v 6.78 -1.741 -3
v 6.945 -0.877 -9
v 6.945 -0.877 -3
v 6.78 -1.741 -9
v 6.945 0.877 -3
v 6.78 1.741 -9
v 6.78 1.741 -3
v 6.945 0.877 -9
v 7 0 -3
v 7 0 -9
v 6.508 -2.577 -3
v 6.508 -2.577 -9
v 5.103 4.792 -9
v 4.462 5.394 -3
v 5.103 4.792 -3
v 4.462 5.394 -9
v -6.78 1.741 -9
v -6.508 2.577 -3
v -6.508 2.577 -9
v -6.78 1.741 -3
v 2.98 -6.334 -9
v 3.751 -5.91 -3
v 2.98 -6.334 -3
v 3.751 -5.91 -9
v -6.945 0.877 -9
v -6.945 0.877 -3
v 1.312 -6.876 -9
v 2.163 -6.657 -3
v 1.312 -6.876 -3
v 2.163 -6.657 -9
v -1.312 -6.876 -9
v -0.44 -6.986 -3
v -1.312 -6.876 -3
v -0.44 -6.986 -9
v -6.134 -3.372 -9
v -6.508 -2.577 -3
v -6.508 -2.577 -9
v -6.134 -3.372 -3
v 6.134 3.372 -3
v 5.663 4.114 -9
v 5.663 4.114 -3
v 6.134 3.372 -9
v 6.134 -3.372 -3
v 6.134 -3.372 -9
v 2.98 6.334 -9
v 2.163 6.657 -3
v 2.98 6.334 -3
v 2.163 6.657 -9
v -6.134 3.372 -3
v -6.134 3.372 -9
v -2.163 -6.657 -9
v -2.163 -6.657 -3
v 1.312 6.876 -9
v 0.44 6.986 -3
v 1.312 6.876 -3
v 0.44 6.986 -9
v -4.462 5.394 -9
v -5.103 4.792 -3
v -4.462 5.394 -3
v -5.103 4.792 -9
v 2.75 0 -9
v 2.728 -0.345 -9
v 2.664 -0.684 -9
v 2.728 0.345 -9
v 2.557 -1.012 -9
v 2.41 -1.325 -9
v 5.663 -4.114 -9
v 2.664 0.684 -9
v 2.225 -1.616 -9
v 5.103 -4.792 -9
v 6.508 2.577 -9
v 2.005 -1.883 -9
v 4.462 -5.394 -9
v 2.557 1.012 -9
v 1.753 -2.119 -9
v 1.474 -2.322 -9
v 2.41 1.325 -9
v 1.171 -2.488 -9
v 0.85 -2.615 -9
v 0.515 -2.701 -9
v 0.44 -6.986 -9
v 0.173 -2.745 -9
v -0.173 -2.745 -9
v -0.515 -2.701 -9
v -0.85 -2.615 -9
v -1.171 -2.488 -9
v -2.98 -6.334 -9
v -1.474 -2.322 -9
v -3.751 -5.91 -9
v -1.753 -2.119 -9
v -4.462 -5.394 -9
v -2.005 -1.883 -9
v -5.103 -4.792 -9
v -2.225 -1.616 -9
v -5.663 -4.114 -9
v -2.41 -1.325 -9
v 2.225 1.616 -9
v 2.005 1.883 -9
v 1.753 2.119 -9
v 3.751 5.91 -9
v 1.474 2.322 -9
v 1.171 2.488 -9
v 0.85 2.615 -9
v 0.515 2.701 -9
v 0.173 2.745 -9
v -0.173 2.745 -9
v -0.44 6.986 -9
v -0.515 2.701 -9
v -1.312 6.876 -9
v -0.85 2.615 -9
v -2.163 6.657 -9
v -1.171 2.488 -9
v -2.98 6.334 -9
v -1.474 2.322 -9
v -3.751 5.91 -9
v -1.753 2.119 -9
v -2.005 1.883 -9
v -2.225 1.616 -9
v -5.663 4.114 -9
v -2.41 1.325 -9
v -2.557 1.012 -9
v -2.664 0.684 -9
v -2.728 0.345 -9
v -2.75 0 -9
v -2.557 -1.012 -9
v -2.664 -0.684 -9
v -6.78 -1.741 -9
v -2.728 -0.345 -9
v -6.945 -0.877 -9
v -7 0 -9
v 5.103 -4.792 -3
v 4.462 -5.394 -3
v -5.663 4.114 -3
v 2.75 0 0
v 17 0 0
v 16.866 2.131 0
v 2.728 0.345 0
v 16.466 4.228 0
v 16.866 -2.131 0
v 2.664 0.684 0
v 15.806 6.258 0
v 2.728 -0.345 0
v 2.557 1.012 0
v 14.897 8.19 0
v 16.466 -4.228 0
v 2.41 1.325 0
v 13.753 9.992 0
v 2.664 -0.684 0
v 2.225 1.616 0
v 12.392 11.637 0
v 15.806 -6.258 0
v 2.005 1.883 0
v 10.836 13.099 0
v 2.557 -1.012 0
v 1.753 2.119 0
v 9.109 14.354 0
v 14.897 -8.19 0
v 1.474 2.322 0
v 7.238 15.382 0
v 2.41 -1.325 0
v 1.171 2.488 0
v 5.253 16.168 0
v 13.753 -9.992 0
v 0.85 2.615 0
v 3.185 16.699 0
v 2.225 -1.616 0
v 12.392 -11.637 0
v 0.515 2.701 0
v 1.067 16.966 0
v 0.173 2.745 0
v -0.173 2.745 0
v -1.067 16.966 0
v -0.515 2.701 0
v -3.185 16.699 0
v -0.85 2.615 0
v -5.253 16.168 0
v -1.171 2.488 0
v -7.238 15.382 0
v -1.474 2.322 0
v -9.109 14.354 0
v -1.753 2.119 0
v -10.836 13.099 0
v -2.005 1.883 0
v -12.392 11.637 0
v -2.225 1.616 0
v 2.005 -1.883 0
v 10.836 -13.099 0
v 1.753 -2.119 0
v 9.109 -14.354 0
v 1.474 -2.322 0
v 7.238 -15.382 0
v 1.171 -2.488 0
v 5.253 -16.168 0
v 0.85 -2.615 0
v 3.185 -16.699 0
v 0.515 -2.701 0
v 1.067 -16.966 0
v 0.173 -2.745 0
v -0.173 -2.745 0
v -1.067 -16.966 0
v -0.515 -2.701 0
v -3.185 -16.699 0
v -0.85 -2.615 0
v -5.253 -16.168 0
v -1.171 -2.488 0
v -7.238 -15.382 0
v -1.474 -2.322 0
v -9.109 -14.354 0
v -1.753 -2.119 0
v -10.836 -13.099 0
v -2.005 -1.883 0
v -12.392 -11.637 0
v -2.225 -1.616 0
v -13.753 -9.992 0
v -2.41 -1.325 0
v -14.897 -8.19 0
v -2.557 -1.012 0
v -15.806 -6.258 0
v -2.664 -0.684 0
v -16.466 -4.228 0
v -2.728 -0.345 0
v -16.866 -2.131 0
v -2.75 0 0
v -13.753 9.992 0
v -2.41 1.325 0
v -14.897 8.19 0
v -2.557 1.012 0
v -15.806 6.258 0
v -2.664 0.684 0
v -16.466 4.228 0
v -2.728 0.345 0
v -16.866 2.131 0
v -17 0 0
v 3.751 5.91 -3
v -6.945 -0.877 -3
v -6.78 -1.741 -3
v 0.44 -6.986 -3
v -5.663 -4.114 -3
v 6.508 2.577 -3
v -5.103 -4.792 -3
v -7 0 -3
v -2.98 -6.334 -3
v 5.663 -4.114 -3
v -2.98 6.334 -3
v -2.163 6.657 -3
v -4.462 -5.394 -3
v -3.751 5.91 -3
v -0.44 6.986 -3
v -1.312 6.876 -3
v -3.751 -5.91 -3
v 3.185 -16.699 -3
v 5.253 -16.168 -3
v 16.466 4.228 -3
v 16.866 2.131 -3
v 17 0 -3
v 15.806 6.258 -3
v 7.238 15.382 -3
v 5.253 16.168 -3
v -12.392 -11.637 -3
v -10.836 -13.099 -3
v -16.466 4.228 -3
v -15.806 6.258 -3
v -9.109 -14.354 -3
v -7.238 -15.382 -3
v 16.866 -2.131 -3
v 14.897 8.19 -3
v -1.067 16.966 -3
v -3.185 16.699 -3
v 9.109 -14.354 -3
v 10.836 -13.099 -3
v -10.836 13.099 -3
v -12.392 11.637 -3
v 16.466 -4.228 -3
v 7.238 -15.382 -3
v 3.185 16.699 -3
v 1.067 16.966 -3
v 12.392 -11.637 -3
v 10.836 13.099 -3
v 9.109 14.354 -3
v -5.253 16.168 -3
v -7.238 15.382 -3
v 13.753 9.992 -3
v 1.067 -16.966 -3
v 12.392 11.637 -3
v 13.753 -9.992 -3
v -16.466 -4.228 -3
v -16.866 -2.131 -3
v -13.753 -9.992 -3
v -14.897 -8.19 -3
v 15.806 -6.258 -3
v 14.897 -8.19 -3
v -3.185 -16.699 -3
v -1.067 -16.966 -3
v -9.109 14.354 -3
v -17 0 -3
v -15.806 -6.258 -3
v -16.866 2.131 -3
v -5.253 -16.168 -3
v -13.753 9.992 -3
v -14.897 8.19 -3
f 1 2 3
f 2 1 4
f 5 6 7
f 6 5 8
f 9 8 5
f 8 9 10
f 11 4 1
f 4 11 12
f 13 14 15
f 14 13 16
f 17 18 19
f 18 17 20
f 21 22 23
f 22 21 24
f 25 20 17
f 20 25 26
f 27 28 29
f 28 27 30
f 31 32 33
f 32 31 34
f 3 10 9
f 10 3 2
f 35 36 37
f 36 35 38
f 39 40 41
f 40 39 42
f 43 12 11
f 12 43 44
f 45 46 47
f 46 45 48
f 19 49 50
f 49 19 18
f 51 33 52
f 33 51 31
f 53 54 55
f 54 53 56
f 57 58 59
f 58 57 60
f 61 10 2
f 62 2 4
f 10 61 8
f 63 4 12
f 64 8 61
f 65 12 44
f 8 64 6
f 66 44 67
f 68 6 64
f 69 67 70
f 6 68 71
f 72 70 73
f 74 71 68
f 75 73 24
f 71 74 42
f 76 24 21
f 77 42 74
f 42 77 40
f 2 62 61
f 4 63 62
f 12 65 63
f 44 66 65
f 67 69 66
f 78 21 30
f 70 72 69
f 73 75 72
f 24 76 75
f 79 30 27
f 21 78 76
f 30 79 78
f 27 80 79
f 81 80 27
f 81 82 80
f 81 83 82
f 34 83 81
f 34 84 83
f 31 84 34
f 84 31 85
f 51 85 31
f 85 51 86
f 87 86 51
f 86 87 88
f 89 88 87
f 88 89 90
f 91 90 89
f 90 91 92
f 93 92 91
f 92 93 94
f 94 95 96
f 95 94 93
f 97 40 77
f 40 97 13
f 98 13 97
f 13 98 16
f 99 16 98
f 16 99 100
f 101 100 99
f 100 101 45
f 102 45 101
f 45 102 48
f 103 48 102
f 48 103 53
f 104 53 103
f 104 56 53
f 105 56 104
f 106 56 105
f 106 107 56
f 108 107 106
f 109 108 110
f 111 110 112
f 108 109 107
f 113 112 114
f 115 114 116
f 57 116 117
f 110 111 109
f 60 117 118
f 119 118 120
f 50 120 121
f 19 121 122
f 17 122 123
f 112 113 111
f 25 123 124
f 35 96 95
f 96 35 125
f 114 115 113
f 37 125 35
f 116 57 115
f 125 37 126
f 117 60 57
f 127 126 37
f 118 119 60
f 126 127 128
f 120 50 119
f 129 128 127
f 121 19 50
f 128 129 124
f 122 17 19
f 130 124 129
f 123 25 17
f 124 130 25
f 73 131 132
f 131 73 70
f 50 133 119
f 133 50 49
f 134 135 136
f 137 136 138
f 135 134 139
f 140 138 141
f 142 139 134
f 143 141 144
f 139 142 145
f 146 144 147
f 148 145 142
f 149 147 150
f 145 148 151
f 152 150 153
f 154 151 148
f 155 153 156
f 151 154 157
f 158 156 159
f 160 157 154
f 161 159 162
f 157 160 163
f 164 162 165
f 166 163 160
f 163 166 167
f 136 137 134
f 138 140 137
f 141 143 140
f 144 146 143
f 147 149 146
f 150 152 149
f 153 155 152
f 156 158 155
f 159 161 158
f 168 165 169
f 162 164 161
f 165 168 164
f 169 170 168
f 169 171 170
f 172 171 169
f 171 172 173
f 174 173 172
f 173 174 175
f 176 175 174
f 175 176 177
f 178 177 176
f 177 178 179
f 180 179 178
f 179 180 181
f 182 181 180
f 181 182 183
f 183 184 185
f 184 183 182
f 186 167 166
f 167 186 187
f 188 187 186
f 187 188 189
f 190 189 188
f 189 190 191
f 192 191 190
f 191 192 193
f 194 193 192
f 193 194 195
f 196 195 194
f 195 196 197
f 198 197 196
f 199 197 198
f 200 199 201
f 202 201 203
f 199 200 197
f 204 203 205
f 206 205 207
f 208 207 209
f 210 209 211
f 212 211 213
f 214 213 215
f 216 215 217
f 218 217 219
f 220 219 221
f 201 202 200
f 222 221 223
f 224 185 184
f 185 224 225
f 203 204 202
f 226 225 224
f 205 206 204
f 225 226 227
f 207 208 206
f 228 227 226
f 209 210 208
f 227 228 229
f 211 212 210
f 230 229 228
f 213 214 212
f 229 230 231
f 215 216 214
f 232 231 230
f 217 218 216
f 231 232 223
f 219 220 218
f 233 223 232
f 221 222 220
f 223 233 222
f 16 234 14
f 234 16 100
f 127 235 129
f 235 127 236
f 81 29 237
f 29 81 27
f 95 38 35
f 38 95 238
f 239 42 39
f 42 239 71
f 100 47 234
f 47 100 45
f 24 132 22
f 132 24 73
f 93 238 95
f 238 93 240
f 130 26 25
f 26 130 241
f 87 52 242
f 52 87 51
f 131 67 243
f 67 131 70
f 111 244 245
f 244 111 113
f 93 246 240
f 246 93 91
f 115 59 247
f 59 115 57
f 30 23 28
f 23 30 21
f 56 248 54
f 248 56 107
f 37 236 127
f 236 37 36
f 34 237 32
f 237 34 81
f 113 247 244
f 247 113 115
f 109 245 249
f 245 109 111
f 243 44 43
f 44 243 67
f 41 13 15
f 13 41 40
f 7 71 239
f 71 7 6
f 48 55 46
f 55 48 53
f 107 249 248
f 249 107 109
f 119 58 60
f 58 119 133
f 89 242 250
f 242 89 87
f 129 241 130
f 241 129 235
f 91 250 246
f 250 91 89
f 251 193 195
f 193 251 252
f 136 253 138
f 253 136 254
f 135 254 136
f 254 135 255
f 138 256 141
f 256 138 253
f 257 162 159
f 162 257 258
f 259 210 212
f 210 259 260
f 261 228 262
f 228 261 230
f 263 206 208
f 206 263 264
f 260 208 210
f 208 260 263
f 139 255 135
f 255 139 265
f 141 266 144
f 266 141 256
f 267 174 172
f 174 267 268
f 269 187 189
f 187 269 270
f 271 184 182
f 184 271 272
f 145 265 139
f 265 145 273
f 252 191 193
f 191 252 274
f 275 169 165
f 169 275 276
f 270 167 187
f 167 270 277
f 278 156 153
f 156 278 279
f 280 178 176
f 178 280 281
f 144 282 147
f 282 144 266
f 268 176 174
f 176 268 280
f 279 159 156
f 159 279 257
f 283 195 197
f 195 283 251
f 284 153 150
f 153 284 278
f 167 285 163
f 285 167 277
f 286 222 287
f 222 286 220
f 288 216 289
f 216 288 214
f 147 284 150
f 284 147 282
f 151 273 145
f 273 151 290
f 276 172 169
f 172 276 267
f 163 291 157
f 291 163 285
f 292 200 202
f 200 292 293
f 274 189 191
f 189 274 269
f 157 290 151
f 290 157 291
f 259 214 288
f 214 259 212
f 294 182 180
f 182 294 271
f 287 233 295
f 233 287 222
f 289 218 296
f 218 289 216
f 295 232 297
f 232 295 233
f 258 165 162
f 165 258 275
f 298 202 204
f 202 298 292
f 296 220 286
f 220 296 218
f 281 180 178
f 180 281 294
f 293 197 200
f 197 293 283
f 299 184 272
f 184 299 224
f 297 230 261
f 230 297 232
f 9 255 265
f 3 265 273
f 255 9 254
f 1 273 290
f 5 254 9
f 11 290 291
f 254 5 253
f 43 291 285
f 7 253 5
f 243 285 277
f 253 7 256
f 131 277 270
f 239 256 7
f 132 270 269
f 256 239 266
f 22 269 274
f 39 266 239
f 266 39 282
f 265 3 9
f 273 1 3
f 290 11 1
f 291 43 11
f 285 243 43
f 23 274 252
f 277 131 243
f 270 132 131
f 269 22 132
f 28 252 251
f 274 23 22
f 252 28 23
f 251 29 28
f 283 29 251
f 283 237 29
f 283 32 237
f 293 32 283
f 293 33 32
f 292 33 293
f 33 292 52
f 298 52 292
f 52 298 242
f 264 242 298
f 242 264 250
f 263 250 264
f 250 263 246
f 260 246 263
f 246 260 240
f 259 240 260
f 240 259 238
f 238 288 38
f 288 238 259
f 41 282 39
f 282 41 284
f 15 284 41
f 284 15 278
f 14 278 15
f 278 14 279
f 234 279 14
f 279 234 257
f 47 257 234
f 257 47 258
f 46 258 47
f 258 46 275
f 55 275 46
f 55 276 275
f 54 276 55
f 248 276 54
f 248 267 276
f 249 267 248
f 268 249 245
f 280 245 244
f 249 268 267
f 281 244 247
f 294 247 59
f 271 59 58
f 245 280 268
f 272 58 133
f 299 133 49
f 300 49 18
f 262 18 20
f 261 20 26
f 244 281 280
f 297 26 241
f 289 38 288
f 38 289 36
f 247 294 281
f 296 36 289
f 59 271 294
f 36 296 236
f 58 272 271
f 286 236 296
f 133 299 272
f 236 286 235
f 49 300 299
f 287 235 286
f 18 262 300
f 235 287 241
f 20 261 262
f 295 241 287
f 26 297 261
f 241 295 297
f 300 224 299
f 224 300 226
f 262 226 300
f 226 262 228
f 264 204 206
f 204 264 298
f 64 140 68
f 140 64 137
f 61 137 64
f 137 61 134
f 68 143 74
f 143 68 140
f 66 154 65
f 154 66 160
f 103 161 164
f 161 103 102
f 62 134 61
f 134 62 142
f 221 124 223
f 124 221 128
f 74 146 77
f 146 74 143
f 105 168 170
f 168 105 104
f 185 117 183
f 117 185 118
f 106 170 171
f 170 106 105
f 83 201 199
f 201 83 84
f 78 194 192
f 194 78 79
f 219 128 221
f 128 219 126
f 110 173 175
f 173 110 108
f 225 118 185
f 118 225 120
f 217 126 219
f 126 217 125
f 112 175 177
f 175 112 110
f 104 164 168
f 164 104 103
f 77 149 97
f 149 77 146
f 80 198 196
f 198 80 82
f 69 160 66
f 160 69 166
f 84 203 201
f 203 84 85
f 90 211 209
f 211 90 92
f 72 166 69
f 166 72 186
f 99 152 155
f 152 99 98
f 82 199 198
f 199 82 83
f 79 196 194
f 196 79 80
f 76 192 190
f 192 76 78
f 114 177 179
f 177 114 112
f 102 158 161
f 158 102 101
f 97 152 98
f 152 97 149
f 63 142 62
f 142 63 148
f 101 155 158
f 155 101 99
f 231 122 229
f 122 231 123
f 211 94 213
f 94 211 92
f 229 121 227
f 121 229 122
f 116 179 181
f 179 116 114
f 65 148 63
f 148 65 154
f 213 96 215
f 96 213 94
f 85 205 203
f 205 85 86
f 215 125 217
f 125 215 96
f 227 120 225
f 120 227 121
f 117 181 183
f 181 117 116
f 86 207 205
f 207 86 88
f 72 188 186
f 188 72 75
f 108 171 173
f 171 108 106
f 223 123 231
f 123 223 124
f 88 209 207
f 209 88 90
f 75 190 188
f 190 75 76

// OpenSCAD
$fn = 50;


difference() {
	union() {
		translate(v = [0, 0, -9.0000000000]) {
			cylinder(h = 9, r = 7.0000000000);
		}
		translate(v = [0, 0, -3.0000000000]) {
			cylinder(h = 3, r = 17.0000000000);
		}
	}
	union() {
		#translate(v = [0, 0, -9]) {
			cylinder(h = 9, r = 2.7500000000);
		}
	}
}
